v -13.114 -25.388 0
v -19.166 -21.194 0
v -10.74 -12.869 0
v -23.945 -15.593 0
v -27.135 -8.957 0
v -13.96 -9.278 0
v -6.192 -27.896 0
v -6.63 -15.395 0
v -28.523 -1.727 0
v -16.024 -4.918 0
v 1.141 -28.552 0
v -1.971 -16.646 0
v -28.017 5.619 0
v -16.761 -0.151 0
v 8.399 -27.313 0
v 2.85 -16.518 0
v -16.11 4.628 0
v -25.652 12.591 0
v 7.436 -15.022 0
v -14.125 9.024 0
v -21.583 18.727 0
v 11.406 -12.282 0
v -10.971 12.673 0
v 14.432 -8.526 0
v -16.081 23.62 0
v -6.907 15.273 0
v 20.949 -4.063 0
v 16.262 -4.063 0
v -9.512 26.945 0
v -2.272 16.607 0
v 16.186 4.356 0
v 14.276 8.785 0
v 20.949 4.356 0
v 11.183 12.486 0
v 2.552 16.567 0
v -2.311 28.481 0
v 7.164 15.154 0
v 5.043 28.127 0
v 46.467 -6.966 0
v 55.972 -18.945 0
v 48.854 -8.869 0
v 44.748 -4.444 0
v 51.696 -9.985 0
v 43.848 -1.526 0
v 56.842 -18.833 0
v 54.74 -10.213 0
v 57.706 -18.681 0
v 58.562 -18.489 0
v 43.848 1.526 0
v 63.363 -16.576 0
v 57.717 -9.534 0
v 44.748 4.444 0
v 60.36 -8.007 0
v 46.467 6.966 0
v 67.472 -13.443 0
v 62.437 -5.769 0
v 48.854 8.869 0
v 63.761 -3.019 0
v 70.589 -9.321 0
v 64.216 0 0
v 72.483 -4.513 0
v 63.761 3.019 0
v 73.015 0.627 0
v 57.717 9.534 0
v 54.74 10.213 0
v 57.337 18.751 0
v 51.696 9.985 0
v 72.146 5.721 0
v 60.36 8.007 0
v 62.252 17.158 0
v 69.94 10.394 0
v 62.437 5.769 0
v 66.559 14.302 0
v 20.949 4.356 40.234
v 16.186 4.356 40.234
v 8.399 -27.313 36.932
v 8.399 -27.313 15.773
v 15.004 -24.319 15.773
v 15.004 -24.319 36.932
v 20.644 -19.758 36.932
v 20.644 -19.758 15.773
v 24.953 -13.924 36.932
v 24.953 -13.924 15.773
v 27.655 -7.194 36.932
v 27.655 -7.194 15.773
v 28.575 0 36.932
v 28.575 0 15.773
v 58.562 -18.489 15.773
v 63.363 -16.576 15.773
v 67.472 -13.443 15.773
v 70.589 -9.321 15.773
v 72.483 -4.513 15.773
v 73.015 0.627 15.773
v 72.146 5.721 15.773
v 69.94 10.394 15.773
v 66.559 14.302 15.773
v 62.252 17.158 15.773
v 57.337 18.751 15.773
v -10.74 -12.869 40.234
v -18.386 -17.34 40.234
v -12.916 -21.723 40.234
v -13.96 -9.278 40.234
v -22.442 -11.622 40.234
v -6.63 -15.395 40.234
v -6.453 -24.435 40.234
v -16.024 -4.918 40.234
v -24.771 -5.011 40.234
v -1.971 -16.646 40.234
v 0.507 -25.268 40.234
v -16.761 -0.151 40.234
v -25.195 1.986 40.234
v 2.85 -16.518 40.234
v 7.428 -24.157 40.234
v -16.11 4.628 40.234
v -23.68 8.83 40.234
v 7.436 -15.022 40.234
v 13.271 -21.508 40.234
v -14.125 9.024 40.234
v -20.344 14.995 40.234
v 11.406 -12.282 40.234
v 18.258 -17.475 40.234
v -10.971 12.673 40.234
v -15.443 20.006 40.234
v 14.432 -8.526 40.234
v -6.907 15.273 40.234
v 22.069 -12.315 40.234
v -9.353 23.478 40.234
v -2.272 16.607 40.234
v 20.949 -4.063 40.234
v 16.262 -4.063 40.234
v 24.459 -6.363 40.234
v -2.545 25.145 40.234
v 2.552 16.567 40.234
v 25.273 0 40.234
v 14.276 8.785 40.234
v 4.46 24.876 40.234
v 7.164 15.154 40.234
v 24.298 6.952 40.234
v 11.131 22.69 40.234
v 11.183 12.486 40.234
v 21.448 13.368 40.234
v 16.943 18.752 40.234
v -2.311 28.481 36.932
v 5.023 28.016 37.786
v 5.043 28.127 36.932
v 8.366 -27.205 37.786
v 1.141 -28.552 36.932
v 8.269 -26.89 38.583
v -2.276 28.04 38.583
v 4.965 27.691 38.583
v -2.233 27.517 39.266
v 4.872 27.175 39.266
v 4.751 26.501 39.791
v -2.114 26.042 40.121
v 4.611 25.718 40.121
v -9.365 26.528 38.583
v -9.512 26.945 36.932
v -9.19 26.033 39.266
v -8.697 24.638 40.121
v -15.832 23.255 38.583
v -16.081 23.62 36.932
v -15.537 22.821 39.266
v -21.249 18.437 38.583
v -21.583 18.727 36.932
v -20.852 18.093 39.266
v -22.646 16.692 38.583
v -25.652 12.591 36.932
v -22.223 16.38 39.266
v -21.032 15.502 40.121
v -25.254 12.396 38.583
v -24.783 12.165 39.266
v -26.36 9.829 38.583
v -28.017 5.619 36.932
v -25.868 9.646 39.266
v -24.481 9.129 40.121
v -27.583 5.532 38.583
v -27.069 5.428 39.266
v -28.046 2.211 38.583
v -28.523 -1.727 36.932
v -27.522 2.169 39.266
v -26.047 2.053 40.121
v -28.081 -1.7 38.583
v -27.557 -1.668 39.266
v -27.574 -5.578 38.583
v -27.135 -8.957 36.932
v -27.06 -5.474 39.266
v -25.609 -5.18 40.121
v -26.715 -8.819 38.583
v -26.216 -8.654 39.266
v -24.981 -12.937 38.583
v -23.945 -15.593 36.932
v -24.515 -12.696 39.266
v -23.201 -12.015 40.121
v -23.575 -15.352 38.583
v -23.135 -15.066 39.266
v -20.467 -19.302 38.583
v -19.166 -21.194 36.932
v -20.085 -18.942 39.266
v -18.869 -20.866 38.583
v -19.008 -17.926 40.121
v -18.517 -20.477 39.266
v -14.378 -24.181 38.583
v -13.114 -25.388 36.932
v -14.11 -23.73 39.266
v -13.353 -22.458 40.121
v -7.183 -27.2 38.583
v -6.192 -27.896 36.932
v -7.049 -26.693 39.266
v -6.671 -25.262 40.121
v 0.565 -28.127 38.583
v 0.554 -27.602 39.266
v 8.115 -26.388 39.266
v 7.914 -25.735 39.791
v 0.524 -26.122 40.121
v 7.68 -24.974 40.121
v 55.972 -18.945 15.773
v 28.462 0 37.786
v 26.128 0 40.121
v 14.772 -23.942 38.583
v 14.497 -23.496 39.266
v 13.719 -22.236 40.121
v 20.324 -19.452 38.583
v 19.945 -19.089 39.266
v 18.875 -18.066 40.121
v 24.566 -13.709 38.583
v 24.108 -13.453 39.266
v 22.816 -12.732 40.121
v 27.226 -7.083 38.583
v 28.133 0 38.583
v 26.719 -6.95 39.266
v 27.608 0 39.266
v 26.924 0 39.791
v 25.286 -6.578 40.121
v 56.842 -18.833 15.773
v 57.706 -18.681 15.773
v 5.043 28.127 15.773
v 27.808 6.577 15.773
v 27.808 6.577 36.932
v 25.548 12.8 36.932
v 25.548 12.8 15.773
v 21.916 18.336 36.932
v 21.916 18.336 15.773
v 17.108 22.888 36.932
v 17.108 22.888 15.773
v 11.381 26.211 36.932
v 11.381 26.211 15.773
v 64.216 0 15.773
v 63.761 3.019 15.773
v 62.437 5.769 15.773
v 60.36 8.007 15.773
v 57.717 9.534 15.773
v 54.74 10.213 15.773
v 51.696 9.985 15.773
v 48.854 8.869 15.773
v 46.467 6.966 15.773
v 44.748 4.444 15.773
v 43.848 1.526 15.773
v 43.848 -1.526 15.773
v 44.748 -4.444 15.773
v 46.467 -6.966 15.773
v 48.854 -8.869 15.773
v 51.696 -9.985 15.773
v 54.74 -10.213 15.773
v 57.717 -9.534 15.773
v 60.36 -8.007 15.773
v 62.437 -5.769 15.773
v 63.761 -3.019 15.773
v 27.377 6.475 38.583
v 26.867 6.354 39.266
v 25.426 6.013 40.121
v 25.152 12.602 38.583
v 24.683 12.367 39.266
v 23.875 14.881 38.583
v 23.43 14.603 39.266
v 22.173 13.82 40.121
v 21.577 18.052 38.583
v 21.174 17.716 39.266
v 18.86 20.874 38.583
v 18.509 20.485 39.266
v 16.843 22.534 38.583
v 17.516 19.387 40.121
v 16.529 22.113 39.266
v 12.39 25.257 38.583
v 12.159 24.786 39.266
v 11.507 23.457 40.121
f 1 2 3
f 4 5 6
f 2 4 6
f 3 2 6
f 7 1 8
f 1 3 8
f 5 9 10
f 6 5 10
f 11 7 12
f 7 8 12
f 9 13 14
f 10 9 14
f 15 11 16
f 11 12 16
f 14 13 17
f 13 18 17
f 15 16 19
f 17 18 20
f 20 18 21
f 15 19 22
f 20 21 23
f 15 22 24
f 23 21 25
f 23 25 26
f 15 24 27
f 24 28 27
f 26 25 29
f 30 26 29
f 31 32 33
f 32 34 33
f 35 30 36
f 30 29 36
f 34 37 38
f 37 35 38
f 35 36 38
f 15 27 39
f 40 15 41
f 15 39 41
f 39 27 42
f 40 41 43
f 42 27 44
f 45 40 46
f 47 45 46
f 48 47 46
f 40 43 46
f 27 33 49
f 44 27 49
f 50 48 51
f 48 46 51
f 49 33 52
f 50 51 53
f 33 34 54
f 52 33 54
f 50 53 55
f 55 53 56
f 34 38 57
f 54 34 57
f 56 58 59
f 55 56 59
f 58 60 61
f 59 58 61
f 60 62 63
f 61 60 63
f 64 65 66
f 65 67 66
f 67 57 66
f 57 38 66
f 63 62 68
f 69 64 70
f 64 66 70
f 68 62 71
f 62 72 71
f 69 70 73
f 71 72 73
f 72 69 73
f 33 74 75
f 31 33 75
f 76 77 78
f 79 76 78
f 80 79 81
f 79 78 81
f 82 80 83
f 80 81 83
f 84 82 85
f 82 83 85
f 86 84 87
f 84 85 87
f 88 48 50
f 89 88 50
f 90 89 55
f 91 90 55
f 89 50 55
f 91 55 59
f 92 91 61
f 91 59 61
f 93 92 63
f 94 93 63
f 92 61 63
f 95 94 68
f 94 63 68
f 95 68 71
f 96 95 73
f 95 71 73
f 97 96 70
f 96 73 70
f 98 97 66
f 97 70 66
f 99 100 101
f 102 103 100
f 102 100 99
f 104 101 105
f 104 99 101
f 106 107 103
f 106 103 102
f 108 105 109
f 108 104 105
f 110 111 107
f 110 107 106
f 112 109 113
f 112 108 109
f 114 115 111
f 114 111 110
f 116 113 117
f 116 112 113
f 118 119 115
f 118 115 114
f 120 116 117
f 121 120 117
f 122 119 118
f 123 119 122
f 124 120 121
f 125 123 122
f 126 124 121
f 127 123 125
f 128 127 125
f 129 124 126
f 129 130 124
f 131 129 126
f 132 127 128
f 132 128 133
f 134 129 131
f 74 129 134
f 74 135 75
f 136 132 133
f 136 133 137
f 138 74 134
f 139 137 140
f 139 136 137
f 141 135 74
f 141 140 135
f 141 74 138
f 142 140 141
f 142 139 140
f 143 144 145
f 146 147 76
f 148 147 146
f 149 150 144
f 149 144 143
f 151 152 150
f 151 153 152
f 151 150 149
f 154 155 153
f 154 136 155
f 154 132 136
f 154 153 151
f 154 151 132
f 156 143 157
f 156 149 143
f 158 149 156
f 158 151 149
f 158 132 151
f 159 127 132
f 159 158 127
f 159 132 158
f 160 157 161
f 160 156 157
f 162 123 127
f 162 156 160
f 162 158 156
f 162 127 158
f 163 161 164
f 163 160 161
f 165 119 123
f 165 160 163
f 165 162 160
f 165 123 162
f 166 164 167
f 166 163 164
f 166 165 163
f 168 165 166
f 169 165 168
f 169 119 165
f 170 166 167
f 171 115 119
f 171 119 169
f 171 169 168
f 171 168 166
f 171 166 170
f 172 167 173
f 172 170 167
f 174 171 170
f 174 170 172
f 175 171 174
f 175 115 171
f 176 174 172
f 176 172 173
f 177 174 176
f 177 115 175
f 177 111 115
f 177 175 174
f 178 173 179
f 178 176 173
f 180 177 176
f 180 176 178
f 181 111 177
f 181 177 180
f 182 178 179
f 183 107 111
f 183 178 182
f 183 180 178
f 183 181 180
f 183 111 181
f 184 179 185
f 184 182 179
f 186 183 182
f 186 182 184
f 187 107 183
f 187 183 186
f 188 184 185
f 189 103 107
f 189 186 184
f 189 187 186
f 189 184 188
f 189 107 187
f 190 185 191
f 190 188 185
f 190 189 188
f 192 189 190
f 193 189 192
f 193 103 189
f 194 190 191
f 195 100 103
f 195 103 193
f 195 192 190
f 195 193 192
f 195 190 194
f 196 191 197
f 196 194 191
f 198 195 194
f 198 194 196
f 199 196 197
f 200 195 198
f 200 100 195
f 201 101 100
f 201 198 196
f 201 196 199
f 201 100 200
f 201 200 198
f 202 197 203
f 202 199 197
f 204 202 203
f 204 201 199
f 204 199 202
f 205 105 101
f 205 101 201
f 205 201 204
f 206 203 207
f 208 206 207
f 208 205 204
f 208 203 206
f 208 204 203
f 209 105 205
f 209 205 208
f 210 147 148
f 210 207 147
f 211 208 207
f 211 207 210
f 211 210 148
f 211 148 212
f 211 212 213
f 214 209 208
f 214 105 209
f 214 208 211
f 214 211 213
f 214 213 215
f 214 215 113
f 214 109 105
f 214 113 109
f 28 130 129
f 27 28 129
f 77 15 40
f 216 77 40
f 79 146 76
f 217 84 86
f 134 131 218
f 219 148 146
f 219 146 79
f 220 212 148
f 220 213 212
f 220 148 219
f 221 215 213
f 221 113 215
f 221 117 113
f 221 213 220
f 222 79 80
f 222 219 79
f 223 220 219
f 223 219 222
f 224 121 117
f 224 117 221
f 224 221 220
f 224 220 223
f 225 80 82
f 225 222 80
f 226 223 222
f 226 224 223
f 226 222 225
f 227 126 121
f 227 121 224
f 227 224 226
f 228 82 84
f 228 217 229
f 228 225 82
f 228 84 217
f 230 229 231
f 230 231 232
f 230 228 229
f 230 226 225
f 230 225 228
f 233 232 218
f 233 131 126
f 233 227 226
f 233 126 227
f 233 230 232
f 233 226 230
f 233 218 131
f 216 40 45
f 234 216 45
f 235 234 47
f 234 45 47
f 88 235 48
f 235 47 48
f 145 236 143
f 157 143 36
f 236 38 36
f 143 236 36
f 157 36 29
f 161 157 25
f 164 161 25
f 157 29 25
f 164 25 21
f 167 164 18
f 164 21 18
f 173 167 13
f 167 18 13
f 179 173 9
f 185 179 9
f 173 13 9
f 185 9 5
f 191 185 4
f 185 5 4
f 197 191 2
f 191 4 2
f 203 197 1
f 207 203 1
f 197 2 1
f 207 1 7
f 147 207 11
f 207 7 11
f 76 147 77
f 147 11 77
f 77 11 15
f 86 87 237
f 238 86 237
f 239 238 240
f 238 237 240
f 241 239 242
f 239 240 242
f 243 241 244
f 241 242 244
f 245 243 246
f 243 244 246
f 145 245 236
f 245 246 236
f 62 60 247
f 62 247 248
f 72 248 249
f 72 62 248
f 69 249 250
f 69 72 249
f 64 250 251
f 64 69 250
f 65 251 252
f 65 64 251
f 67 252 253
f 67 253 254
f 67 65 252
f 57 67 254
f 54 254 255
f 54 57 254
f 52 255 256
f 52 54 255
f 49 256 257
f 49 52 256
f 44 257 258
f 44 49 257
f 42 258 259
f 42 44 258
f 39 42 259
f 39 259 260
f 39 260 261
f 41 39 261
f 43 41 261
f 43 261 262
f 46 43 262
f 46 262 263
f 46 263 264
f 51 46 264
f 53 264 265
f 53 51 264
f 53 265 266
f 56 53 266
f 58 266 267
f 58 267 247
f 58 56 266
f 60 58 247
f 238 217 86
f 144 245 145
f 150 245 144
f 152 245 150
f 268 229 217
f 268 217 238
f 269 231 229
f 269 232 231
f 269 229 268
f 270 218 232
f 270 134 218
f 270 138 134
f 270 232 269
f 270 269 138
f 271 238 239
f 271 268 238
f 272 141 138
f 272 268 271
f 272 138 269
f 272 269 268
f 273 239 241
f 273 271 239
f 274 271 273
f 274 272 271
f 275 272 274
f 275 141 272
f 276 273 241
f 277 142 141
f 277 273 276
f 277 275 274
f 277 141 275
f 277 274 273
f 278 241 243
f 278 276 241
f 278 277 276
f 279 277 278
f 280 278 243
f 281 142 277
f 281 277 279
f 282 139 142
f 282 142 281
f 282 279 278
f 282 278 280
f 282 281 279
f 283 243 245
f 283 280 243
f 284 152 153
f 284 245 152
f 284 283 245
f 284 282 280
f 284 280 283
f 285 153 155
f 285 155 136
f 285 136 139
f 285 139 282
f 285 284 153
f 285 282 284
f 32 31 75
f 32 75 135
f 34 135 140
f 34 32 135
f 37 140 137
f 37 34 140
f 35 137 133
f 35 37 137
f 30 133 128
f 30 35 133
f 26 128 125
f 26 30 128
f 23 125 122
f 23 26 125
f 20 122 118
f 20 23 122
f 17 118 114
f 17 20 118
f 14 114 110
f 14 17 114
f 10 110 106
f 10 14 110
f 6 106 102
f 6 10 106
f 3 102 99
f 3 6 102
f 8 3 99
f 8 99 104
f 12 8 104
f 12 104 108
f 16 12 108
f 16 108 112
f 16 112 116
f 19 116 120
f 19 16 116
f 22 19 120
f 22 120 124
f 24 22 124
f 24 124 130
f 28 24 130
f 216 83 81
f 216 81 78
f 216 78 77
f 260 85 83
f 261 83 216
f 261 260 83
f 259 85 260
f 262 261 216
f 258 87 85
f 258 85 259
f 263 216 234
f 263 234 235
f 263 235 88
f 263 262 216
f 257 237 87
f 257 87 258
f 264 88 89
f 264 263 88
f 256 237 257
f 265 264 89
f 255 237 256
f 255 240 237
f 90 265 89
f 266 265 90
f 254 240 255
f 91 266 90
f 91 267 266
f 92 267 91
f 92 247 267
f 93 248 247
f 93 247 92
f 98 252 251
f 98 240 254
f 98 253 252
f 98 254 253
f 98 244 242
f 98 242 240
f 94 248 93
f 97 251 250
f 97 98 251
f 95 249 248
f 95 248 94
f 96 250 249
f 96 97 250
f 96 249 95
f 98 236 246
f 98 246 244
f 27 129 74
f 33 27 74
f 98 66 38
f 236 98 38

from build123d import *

# Parameters (mm, degrees)
F0_R     = 16.762017
F0_R_2   = 10.2415
F1_DEPTH = 15.7734
F2_DEPTH = 40.2336
F4_DEPTH = 57.912
F5_R     = 3.302


with BuildPart() as f1:
    # F0 (on Top) → F1 (new body)
    with BuildSketch(Plane.XY):
        with BuildLine():
            ThreePointArc((8.398844, -27.312818), (22.98399, -16.978422), (28.575, 0))
            ThreePointArc((28.575, 0), (21.916025, 18.336262), (5.042647, 28.126541))
            ThreePointArc((5.042647, 28.126541), (-28.522782, -1.726717), (8.398844, -27.312818))
        make_face()
        Circle(F0_R, mode=Mode.SUBTRACT)
        with BuildLine():
            ThreePointArc((5.042647, 28.126541), (21.916025, 18.336262), (28.575, 0))
            ThreePointArc((28.575, 0), (22.98399, -16.978422), (8.398844, -27.312818))
            Line((8.398844, -27.312818), (55.972016, -18.945037))
            Line((55.972016, -18.945037), (58.562435, -18.489401))
            ThreePointArc((58.562435, -18.489401), (73.014691, 0.626641), (57.336765, 18.751028))
            Line((57.336765, 18.751028), (5.042647, 28.126541))
        make_face()
        with Locations((53.975, 0)):
            Circle(F0_R_2, mode=Mode.SUBTRACT)
        with BuildLine():
            Line((58.562435, -18.489401), (55.972016, -18.945037))
            ThreePointArc((55.972016, -18.945037), (57.275098, -18.761979), (58.562435, -18.489401))
        make_face()
    extrude(amount=F1_DEPTH)

    # F0 (on Top) → F2 (join)
    with BuildSketch(Plane.XY):
        with BuildLine():
            ThreePointArc((8.398844, -27.312818), (22.98399, -16.978422), (28.575, 0))
            ThreePointArc((28.575, 0), (21.916025, 18.336262), (5.042647, 28.126541))
            ThreePointArc((5.042647, 28.126541), (-28.522782, -1.726717), (8.398844, -27.312818))
        make_face()
        Circle(F0_R, mode=Mode.SUBTRACT)
    extrude(amount=F2_DEPTH)

    # F3 (on face) → F4 (cut)
    with BuildSketch(Plane.XY.offset(40.2336)):
        with BuildLine():
            Line((20.948661, 4.355739), (16.18619, 4.355739))
            ThreePointArc((16.18619, 4.355739), (16.617437, 2.196818), (16.762017, 0))
            ThreePointArc((16.762017, 0), (16.6366, -2.046642), (16.262227, -4.062657))
            Line((16.262227, -4.062657), (20.948661, -4.062657))
            Line((20.948661, -4.062657), (20.948661, 4.355739))
        make_face()
    extrude(amount=-F4_DEPTH, mode=Mode.SUBTRACT)

    # F5
    f5_edges = [f1.edges().sort_by_distance(p)[0] for p in [
        (-8.398844, 27.312818, 40.2336),
    ]]
    fillet(f5_edges, radius=F5_R)


solid = f1.part
